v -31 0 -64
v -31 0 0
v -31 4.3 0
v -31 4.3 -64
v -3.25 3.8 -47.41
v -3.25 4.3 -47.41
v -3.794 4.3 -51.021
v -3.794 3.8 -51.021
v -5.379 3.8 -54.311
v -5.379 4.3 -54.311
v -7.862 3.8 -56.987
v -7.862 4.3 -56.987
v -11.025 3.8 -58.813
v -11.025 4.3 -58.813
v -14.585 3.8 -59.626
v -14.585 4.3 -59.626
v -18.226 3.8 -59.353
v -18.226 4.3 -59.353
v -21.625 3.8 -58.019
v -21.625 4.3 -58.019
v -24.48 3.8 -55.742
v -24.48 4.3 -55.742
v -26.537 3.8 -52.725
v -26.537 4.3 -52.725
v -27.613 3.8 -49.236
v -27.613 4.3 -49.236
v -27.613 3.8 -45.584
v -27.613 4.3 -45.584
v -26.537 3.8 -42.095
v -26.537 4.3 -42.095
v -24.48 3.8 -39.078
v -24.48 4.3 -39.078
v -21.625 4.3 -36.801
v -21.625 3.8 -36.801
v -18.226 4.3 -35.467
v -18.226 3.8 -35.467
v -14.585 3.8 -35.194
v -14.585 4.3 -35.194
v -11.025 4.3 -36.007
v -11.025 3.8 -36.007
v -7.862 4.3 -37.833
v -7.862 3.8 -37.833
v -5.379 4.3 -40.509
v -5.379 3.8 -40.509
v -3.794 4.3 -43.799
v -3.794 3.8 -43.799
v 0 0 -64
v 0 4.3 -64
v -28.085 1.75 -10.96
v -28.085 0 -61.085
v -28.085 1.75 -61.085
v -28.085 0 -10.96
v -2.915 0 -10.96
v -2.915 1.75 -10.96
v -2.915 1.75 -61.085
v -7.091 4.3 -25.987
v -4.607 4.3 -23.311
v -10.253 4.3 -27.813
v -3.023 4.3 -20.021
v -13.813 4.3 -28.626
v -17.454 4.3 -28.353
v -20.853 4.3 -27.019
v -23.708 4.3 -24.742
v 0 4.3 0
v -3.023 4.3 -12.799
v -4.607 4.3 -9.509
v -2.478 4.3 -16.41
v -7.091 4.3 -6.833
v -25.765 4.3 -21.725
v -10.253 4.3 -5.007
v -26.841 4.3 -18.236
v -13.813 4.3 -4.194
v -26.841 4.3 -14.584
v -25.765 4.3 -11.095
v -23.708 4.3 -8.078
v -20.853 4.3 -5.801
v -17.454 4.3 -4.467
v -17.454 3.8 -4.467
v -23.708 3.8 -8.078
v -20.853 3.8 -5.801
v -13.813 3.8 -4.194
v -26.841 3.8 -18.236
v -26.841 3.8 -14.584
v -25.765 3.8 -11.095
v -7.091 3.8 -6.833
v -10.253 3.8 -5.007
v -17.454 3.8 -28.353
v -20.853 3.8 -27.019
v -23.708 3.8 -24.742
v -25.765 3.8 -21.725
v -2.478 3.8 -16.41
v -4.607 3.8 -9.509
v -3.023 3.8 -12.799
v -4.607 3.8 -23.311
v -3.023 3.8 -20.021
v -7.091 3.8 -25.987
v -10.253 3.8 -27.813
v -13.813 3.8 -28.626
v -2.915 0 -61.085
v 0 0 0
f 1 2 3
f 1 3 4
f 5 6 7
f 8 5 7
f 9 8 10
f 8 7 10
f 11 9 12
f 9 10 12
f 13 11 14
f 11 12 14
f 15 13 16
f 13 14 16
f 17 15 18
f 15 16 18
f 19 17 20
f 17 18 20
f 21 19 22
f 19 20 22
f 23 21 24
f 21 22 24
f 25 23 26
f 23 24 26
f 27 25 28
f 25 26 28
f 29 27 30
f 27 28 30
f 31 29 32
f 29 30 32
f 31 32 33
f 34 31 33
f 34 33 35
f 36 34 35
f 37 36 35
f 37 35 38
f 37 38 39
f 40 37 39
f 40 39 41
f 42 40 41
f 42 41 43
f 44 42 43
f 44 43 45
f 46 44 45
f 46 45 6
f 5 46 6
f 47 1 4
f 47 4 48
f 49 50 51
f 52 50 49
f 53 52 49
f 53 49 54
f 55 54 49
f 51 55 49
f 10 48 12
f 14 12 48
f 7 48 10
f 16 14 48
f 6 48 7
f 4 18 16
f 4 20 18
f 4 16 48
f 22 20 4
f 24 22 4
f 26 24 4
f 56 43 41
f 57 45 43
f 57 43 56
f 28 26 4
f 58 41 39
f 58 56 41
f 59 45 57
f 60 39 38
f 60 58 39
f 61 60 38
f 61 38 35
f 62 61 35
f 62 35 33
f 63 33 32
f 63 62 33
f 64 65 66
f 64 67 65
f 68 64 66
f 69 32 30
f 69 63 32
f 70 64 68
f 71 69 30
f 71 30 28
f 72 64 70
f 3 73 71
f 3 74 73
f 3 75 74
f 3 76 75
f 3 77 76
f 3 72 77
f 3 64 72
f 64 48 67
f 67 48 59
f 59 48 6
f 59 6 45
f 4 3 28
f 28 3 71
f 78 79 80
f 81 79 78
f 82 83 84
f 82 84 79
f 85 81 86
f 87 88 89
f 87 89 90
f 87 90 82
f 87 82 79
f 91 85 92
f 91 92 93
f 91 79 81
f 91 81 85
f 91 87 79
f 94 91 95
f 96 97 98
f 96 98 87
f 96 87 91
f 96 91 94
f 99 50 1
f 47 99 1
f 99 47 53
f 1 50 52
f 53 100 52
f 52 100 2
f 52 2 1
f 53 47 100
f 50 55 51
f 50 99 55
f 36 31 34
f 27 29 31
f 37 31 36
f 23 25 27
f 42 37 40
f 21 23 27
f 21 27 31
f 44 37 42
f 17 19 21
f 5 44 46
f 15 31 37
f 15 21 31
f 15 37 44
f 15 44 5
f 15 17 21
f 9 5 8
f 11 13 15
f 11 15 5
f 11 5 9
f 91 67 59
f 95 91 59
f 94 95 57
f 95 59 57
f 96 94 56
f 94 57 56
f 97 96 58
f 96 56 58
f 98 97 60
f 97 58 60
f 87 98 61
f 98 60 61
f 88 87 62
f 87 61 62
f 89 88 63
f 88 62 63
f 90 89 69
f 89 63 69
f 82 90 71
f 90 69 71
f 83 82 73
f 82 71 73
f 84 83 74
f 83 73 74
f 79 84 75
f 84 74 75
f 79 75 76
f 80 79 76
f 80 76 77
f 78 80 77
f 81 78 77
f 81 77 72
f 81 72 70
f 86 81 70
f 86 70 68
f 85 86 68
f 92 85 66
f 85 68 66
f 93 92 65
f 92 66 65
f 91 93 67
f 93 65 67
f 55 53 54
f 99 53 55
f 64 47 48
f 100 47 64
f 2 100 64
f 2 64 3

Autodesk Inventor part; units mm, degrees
ref_plane "YZ Plane" through (0, 0, 0) normal (1, 0, 0) x (0, 1, 0)
ref_plane "XZ Plane" through (0, 0, 0) normal (0, 1, 0) x (-1, 0, 0)
ref_plane "XY Plane" through (0, 0, 0) normal (0, 0, 1) x (1, 0, 0)
sketch "Sketch1" plane through (0, 0, 0) normal (0, 1, 0) x (-1, 0, 0)
  line L0 (0, 0) -> (31, 0)
  line L1 (31, 0) -> (31, -64)
  line L2 (31, -64) -> (0, -64)
  line L3 (0, -64) -> (0, 0)
  line L4 (28.085, -10.96) -> (2.915, -10.96)
  line L5 (2.915, -10.96) -> (2.915, -61.085)
  line L6 (2.915, -61.085) -> (28.085, -61.085)
  line L7 (28.085, -61.085) -> (28.085, -10.96)
  line L8 (31, -43.4956) -> (28.085, -43.4956) construction
  line L9 (15.5, -61.085) -> (15.5, -64) construction
  line L10 (31, -4.16) -> (0, -4.16)
  line L11 (31, -10.96) -> (0, -10.96)
  point P0 (15.5, -10.96)
  point P1 (15.5, 0)
  dimension "d0" = 31
  dimension "d1" = 64
  dimension "d2" = 25.17
  dimension "d4" = 4.16
  dimension "d5" = 6.8
extrude "Extrusion1" add sketch "Sketch1" along normal blind 4.3
extrude "Extrusion2" cut sketch "Sketch1" along normal blind 1.75 contours L4 L7 L6 L5
sketch "Sketch2" plane through (0, 4.3, 0) normal (0, 1, 0) x (1, 0, 0)
  circle A0 centre (-15.5, 47.41) radius 12.25
  line L0 (0, 64) -> (-31, 64) projected
  circle A1 centre (-14.7283, 16.41) radius 12.25
  line L1 (-31, 0) -> (0, 0) projected
  point P0 (-15.5, 64)
  dimension "d10" = 24.5
  dimension "d11" = 4.34
  dimension "d13" = 28.66
extrude "Extrusion3" cut sketch "Sketch2" against normal blind 0.5
properties part number "ShelfLabel"
